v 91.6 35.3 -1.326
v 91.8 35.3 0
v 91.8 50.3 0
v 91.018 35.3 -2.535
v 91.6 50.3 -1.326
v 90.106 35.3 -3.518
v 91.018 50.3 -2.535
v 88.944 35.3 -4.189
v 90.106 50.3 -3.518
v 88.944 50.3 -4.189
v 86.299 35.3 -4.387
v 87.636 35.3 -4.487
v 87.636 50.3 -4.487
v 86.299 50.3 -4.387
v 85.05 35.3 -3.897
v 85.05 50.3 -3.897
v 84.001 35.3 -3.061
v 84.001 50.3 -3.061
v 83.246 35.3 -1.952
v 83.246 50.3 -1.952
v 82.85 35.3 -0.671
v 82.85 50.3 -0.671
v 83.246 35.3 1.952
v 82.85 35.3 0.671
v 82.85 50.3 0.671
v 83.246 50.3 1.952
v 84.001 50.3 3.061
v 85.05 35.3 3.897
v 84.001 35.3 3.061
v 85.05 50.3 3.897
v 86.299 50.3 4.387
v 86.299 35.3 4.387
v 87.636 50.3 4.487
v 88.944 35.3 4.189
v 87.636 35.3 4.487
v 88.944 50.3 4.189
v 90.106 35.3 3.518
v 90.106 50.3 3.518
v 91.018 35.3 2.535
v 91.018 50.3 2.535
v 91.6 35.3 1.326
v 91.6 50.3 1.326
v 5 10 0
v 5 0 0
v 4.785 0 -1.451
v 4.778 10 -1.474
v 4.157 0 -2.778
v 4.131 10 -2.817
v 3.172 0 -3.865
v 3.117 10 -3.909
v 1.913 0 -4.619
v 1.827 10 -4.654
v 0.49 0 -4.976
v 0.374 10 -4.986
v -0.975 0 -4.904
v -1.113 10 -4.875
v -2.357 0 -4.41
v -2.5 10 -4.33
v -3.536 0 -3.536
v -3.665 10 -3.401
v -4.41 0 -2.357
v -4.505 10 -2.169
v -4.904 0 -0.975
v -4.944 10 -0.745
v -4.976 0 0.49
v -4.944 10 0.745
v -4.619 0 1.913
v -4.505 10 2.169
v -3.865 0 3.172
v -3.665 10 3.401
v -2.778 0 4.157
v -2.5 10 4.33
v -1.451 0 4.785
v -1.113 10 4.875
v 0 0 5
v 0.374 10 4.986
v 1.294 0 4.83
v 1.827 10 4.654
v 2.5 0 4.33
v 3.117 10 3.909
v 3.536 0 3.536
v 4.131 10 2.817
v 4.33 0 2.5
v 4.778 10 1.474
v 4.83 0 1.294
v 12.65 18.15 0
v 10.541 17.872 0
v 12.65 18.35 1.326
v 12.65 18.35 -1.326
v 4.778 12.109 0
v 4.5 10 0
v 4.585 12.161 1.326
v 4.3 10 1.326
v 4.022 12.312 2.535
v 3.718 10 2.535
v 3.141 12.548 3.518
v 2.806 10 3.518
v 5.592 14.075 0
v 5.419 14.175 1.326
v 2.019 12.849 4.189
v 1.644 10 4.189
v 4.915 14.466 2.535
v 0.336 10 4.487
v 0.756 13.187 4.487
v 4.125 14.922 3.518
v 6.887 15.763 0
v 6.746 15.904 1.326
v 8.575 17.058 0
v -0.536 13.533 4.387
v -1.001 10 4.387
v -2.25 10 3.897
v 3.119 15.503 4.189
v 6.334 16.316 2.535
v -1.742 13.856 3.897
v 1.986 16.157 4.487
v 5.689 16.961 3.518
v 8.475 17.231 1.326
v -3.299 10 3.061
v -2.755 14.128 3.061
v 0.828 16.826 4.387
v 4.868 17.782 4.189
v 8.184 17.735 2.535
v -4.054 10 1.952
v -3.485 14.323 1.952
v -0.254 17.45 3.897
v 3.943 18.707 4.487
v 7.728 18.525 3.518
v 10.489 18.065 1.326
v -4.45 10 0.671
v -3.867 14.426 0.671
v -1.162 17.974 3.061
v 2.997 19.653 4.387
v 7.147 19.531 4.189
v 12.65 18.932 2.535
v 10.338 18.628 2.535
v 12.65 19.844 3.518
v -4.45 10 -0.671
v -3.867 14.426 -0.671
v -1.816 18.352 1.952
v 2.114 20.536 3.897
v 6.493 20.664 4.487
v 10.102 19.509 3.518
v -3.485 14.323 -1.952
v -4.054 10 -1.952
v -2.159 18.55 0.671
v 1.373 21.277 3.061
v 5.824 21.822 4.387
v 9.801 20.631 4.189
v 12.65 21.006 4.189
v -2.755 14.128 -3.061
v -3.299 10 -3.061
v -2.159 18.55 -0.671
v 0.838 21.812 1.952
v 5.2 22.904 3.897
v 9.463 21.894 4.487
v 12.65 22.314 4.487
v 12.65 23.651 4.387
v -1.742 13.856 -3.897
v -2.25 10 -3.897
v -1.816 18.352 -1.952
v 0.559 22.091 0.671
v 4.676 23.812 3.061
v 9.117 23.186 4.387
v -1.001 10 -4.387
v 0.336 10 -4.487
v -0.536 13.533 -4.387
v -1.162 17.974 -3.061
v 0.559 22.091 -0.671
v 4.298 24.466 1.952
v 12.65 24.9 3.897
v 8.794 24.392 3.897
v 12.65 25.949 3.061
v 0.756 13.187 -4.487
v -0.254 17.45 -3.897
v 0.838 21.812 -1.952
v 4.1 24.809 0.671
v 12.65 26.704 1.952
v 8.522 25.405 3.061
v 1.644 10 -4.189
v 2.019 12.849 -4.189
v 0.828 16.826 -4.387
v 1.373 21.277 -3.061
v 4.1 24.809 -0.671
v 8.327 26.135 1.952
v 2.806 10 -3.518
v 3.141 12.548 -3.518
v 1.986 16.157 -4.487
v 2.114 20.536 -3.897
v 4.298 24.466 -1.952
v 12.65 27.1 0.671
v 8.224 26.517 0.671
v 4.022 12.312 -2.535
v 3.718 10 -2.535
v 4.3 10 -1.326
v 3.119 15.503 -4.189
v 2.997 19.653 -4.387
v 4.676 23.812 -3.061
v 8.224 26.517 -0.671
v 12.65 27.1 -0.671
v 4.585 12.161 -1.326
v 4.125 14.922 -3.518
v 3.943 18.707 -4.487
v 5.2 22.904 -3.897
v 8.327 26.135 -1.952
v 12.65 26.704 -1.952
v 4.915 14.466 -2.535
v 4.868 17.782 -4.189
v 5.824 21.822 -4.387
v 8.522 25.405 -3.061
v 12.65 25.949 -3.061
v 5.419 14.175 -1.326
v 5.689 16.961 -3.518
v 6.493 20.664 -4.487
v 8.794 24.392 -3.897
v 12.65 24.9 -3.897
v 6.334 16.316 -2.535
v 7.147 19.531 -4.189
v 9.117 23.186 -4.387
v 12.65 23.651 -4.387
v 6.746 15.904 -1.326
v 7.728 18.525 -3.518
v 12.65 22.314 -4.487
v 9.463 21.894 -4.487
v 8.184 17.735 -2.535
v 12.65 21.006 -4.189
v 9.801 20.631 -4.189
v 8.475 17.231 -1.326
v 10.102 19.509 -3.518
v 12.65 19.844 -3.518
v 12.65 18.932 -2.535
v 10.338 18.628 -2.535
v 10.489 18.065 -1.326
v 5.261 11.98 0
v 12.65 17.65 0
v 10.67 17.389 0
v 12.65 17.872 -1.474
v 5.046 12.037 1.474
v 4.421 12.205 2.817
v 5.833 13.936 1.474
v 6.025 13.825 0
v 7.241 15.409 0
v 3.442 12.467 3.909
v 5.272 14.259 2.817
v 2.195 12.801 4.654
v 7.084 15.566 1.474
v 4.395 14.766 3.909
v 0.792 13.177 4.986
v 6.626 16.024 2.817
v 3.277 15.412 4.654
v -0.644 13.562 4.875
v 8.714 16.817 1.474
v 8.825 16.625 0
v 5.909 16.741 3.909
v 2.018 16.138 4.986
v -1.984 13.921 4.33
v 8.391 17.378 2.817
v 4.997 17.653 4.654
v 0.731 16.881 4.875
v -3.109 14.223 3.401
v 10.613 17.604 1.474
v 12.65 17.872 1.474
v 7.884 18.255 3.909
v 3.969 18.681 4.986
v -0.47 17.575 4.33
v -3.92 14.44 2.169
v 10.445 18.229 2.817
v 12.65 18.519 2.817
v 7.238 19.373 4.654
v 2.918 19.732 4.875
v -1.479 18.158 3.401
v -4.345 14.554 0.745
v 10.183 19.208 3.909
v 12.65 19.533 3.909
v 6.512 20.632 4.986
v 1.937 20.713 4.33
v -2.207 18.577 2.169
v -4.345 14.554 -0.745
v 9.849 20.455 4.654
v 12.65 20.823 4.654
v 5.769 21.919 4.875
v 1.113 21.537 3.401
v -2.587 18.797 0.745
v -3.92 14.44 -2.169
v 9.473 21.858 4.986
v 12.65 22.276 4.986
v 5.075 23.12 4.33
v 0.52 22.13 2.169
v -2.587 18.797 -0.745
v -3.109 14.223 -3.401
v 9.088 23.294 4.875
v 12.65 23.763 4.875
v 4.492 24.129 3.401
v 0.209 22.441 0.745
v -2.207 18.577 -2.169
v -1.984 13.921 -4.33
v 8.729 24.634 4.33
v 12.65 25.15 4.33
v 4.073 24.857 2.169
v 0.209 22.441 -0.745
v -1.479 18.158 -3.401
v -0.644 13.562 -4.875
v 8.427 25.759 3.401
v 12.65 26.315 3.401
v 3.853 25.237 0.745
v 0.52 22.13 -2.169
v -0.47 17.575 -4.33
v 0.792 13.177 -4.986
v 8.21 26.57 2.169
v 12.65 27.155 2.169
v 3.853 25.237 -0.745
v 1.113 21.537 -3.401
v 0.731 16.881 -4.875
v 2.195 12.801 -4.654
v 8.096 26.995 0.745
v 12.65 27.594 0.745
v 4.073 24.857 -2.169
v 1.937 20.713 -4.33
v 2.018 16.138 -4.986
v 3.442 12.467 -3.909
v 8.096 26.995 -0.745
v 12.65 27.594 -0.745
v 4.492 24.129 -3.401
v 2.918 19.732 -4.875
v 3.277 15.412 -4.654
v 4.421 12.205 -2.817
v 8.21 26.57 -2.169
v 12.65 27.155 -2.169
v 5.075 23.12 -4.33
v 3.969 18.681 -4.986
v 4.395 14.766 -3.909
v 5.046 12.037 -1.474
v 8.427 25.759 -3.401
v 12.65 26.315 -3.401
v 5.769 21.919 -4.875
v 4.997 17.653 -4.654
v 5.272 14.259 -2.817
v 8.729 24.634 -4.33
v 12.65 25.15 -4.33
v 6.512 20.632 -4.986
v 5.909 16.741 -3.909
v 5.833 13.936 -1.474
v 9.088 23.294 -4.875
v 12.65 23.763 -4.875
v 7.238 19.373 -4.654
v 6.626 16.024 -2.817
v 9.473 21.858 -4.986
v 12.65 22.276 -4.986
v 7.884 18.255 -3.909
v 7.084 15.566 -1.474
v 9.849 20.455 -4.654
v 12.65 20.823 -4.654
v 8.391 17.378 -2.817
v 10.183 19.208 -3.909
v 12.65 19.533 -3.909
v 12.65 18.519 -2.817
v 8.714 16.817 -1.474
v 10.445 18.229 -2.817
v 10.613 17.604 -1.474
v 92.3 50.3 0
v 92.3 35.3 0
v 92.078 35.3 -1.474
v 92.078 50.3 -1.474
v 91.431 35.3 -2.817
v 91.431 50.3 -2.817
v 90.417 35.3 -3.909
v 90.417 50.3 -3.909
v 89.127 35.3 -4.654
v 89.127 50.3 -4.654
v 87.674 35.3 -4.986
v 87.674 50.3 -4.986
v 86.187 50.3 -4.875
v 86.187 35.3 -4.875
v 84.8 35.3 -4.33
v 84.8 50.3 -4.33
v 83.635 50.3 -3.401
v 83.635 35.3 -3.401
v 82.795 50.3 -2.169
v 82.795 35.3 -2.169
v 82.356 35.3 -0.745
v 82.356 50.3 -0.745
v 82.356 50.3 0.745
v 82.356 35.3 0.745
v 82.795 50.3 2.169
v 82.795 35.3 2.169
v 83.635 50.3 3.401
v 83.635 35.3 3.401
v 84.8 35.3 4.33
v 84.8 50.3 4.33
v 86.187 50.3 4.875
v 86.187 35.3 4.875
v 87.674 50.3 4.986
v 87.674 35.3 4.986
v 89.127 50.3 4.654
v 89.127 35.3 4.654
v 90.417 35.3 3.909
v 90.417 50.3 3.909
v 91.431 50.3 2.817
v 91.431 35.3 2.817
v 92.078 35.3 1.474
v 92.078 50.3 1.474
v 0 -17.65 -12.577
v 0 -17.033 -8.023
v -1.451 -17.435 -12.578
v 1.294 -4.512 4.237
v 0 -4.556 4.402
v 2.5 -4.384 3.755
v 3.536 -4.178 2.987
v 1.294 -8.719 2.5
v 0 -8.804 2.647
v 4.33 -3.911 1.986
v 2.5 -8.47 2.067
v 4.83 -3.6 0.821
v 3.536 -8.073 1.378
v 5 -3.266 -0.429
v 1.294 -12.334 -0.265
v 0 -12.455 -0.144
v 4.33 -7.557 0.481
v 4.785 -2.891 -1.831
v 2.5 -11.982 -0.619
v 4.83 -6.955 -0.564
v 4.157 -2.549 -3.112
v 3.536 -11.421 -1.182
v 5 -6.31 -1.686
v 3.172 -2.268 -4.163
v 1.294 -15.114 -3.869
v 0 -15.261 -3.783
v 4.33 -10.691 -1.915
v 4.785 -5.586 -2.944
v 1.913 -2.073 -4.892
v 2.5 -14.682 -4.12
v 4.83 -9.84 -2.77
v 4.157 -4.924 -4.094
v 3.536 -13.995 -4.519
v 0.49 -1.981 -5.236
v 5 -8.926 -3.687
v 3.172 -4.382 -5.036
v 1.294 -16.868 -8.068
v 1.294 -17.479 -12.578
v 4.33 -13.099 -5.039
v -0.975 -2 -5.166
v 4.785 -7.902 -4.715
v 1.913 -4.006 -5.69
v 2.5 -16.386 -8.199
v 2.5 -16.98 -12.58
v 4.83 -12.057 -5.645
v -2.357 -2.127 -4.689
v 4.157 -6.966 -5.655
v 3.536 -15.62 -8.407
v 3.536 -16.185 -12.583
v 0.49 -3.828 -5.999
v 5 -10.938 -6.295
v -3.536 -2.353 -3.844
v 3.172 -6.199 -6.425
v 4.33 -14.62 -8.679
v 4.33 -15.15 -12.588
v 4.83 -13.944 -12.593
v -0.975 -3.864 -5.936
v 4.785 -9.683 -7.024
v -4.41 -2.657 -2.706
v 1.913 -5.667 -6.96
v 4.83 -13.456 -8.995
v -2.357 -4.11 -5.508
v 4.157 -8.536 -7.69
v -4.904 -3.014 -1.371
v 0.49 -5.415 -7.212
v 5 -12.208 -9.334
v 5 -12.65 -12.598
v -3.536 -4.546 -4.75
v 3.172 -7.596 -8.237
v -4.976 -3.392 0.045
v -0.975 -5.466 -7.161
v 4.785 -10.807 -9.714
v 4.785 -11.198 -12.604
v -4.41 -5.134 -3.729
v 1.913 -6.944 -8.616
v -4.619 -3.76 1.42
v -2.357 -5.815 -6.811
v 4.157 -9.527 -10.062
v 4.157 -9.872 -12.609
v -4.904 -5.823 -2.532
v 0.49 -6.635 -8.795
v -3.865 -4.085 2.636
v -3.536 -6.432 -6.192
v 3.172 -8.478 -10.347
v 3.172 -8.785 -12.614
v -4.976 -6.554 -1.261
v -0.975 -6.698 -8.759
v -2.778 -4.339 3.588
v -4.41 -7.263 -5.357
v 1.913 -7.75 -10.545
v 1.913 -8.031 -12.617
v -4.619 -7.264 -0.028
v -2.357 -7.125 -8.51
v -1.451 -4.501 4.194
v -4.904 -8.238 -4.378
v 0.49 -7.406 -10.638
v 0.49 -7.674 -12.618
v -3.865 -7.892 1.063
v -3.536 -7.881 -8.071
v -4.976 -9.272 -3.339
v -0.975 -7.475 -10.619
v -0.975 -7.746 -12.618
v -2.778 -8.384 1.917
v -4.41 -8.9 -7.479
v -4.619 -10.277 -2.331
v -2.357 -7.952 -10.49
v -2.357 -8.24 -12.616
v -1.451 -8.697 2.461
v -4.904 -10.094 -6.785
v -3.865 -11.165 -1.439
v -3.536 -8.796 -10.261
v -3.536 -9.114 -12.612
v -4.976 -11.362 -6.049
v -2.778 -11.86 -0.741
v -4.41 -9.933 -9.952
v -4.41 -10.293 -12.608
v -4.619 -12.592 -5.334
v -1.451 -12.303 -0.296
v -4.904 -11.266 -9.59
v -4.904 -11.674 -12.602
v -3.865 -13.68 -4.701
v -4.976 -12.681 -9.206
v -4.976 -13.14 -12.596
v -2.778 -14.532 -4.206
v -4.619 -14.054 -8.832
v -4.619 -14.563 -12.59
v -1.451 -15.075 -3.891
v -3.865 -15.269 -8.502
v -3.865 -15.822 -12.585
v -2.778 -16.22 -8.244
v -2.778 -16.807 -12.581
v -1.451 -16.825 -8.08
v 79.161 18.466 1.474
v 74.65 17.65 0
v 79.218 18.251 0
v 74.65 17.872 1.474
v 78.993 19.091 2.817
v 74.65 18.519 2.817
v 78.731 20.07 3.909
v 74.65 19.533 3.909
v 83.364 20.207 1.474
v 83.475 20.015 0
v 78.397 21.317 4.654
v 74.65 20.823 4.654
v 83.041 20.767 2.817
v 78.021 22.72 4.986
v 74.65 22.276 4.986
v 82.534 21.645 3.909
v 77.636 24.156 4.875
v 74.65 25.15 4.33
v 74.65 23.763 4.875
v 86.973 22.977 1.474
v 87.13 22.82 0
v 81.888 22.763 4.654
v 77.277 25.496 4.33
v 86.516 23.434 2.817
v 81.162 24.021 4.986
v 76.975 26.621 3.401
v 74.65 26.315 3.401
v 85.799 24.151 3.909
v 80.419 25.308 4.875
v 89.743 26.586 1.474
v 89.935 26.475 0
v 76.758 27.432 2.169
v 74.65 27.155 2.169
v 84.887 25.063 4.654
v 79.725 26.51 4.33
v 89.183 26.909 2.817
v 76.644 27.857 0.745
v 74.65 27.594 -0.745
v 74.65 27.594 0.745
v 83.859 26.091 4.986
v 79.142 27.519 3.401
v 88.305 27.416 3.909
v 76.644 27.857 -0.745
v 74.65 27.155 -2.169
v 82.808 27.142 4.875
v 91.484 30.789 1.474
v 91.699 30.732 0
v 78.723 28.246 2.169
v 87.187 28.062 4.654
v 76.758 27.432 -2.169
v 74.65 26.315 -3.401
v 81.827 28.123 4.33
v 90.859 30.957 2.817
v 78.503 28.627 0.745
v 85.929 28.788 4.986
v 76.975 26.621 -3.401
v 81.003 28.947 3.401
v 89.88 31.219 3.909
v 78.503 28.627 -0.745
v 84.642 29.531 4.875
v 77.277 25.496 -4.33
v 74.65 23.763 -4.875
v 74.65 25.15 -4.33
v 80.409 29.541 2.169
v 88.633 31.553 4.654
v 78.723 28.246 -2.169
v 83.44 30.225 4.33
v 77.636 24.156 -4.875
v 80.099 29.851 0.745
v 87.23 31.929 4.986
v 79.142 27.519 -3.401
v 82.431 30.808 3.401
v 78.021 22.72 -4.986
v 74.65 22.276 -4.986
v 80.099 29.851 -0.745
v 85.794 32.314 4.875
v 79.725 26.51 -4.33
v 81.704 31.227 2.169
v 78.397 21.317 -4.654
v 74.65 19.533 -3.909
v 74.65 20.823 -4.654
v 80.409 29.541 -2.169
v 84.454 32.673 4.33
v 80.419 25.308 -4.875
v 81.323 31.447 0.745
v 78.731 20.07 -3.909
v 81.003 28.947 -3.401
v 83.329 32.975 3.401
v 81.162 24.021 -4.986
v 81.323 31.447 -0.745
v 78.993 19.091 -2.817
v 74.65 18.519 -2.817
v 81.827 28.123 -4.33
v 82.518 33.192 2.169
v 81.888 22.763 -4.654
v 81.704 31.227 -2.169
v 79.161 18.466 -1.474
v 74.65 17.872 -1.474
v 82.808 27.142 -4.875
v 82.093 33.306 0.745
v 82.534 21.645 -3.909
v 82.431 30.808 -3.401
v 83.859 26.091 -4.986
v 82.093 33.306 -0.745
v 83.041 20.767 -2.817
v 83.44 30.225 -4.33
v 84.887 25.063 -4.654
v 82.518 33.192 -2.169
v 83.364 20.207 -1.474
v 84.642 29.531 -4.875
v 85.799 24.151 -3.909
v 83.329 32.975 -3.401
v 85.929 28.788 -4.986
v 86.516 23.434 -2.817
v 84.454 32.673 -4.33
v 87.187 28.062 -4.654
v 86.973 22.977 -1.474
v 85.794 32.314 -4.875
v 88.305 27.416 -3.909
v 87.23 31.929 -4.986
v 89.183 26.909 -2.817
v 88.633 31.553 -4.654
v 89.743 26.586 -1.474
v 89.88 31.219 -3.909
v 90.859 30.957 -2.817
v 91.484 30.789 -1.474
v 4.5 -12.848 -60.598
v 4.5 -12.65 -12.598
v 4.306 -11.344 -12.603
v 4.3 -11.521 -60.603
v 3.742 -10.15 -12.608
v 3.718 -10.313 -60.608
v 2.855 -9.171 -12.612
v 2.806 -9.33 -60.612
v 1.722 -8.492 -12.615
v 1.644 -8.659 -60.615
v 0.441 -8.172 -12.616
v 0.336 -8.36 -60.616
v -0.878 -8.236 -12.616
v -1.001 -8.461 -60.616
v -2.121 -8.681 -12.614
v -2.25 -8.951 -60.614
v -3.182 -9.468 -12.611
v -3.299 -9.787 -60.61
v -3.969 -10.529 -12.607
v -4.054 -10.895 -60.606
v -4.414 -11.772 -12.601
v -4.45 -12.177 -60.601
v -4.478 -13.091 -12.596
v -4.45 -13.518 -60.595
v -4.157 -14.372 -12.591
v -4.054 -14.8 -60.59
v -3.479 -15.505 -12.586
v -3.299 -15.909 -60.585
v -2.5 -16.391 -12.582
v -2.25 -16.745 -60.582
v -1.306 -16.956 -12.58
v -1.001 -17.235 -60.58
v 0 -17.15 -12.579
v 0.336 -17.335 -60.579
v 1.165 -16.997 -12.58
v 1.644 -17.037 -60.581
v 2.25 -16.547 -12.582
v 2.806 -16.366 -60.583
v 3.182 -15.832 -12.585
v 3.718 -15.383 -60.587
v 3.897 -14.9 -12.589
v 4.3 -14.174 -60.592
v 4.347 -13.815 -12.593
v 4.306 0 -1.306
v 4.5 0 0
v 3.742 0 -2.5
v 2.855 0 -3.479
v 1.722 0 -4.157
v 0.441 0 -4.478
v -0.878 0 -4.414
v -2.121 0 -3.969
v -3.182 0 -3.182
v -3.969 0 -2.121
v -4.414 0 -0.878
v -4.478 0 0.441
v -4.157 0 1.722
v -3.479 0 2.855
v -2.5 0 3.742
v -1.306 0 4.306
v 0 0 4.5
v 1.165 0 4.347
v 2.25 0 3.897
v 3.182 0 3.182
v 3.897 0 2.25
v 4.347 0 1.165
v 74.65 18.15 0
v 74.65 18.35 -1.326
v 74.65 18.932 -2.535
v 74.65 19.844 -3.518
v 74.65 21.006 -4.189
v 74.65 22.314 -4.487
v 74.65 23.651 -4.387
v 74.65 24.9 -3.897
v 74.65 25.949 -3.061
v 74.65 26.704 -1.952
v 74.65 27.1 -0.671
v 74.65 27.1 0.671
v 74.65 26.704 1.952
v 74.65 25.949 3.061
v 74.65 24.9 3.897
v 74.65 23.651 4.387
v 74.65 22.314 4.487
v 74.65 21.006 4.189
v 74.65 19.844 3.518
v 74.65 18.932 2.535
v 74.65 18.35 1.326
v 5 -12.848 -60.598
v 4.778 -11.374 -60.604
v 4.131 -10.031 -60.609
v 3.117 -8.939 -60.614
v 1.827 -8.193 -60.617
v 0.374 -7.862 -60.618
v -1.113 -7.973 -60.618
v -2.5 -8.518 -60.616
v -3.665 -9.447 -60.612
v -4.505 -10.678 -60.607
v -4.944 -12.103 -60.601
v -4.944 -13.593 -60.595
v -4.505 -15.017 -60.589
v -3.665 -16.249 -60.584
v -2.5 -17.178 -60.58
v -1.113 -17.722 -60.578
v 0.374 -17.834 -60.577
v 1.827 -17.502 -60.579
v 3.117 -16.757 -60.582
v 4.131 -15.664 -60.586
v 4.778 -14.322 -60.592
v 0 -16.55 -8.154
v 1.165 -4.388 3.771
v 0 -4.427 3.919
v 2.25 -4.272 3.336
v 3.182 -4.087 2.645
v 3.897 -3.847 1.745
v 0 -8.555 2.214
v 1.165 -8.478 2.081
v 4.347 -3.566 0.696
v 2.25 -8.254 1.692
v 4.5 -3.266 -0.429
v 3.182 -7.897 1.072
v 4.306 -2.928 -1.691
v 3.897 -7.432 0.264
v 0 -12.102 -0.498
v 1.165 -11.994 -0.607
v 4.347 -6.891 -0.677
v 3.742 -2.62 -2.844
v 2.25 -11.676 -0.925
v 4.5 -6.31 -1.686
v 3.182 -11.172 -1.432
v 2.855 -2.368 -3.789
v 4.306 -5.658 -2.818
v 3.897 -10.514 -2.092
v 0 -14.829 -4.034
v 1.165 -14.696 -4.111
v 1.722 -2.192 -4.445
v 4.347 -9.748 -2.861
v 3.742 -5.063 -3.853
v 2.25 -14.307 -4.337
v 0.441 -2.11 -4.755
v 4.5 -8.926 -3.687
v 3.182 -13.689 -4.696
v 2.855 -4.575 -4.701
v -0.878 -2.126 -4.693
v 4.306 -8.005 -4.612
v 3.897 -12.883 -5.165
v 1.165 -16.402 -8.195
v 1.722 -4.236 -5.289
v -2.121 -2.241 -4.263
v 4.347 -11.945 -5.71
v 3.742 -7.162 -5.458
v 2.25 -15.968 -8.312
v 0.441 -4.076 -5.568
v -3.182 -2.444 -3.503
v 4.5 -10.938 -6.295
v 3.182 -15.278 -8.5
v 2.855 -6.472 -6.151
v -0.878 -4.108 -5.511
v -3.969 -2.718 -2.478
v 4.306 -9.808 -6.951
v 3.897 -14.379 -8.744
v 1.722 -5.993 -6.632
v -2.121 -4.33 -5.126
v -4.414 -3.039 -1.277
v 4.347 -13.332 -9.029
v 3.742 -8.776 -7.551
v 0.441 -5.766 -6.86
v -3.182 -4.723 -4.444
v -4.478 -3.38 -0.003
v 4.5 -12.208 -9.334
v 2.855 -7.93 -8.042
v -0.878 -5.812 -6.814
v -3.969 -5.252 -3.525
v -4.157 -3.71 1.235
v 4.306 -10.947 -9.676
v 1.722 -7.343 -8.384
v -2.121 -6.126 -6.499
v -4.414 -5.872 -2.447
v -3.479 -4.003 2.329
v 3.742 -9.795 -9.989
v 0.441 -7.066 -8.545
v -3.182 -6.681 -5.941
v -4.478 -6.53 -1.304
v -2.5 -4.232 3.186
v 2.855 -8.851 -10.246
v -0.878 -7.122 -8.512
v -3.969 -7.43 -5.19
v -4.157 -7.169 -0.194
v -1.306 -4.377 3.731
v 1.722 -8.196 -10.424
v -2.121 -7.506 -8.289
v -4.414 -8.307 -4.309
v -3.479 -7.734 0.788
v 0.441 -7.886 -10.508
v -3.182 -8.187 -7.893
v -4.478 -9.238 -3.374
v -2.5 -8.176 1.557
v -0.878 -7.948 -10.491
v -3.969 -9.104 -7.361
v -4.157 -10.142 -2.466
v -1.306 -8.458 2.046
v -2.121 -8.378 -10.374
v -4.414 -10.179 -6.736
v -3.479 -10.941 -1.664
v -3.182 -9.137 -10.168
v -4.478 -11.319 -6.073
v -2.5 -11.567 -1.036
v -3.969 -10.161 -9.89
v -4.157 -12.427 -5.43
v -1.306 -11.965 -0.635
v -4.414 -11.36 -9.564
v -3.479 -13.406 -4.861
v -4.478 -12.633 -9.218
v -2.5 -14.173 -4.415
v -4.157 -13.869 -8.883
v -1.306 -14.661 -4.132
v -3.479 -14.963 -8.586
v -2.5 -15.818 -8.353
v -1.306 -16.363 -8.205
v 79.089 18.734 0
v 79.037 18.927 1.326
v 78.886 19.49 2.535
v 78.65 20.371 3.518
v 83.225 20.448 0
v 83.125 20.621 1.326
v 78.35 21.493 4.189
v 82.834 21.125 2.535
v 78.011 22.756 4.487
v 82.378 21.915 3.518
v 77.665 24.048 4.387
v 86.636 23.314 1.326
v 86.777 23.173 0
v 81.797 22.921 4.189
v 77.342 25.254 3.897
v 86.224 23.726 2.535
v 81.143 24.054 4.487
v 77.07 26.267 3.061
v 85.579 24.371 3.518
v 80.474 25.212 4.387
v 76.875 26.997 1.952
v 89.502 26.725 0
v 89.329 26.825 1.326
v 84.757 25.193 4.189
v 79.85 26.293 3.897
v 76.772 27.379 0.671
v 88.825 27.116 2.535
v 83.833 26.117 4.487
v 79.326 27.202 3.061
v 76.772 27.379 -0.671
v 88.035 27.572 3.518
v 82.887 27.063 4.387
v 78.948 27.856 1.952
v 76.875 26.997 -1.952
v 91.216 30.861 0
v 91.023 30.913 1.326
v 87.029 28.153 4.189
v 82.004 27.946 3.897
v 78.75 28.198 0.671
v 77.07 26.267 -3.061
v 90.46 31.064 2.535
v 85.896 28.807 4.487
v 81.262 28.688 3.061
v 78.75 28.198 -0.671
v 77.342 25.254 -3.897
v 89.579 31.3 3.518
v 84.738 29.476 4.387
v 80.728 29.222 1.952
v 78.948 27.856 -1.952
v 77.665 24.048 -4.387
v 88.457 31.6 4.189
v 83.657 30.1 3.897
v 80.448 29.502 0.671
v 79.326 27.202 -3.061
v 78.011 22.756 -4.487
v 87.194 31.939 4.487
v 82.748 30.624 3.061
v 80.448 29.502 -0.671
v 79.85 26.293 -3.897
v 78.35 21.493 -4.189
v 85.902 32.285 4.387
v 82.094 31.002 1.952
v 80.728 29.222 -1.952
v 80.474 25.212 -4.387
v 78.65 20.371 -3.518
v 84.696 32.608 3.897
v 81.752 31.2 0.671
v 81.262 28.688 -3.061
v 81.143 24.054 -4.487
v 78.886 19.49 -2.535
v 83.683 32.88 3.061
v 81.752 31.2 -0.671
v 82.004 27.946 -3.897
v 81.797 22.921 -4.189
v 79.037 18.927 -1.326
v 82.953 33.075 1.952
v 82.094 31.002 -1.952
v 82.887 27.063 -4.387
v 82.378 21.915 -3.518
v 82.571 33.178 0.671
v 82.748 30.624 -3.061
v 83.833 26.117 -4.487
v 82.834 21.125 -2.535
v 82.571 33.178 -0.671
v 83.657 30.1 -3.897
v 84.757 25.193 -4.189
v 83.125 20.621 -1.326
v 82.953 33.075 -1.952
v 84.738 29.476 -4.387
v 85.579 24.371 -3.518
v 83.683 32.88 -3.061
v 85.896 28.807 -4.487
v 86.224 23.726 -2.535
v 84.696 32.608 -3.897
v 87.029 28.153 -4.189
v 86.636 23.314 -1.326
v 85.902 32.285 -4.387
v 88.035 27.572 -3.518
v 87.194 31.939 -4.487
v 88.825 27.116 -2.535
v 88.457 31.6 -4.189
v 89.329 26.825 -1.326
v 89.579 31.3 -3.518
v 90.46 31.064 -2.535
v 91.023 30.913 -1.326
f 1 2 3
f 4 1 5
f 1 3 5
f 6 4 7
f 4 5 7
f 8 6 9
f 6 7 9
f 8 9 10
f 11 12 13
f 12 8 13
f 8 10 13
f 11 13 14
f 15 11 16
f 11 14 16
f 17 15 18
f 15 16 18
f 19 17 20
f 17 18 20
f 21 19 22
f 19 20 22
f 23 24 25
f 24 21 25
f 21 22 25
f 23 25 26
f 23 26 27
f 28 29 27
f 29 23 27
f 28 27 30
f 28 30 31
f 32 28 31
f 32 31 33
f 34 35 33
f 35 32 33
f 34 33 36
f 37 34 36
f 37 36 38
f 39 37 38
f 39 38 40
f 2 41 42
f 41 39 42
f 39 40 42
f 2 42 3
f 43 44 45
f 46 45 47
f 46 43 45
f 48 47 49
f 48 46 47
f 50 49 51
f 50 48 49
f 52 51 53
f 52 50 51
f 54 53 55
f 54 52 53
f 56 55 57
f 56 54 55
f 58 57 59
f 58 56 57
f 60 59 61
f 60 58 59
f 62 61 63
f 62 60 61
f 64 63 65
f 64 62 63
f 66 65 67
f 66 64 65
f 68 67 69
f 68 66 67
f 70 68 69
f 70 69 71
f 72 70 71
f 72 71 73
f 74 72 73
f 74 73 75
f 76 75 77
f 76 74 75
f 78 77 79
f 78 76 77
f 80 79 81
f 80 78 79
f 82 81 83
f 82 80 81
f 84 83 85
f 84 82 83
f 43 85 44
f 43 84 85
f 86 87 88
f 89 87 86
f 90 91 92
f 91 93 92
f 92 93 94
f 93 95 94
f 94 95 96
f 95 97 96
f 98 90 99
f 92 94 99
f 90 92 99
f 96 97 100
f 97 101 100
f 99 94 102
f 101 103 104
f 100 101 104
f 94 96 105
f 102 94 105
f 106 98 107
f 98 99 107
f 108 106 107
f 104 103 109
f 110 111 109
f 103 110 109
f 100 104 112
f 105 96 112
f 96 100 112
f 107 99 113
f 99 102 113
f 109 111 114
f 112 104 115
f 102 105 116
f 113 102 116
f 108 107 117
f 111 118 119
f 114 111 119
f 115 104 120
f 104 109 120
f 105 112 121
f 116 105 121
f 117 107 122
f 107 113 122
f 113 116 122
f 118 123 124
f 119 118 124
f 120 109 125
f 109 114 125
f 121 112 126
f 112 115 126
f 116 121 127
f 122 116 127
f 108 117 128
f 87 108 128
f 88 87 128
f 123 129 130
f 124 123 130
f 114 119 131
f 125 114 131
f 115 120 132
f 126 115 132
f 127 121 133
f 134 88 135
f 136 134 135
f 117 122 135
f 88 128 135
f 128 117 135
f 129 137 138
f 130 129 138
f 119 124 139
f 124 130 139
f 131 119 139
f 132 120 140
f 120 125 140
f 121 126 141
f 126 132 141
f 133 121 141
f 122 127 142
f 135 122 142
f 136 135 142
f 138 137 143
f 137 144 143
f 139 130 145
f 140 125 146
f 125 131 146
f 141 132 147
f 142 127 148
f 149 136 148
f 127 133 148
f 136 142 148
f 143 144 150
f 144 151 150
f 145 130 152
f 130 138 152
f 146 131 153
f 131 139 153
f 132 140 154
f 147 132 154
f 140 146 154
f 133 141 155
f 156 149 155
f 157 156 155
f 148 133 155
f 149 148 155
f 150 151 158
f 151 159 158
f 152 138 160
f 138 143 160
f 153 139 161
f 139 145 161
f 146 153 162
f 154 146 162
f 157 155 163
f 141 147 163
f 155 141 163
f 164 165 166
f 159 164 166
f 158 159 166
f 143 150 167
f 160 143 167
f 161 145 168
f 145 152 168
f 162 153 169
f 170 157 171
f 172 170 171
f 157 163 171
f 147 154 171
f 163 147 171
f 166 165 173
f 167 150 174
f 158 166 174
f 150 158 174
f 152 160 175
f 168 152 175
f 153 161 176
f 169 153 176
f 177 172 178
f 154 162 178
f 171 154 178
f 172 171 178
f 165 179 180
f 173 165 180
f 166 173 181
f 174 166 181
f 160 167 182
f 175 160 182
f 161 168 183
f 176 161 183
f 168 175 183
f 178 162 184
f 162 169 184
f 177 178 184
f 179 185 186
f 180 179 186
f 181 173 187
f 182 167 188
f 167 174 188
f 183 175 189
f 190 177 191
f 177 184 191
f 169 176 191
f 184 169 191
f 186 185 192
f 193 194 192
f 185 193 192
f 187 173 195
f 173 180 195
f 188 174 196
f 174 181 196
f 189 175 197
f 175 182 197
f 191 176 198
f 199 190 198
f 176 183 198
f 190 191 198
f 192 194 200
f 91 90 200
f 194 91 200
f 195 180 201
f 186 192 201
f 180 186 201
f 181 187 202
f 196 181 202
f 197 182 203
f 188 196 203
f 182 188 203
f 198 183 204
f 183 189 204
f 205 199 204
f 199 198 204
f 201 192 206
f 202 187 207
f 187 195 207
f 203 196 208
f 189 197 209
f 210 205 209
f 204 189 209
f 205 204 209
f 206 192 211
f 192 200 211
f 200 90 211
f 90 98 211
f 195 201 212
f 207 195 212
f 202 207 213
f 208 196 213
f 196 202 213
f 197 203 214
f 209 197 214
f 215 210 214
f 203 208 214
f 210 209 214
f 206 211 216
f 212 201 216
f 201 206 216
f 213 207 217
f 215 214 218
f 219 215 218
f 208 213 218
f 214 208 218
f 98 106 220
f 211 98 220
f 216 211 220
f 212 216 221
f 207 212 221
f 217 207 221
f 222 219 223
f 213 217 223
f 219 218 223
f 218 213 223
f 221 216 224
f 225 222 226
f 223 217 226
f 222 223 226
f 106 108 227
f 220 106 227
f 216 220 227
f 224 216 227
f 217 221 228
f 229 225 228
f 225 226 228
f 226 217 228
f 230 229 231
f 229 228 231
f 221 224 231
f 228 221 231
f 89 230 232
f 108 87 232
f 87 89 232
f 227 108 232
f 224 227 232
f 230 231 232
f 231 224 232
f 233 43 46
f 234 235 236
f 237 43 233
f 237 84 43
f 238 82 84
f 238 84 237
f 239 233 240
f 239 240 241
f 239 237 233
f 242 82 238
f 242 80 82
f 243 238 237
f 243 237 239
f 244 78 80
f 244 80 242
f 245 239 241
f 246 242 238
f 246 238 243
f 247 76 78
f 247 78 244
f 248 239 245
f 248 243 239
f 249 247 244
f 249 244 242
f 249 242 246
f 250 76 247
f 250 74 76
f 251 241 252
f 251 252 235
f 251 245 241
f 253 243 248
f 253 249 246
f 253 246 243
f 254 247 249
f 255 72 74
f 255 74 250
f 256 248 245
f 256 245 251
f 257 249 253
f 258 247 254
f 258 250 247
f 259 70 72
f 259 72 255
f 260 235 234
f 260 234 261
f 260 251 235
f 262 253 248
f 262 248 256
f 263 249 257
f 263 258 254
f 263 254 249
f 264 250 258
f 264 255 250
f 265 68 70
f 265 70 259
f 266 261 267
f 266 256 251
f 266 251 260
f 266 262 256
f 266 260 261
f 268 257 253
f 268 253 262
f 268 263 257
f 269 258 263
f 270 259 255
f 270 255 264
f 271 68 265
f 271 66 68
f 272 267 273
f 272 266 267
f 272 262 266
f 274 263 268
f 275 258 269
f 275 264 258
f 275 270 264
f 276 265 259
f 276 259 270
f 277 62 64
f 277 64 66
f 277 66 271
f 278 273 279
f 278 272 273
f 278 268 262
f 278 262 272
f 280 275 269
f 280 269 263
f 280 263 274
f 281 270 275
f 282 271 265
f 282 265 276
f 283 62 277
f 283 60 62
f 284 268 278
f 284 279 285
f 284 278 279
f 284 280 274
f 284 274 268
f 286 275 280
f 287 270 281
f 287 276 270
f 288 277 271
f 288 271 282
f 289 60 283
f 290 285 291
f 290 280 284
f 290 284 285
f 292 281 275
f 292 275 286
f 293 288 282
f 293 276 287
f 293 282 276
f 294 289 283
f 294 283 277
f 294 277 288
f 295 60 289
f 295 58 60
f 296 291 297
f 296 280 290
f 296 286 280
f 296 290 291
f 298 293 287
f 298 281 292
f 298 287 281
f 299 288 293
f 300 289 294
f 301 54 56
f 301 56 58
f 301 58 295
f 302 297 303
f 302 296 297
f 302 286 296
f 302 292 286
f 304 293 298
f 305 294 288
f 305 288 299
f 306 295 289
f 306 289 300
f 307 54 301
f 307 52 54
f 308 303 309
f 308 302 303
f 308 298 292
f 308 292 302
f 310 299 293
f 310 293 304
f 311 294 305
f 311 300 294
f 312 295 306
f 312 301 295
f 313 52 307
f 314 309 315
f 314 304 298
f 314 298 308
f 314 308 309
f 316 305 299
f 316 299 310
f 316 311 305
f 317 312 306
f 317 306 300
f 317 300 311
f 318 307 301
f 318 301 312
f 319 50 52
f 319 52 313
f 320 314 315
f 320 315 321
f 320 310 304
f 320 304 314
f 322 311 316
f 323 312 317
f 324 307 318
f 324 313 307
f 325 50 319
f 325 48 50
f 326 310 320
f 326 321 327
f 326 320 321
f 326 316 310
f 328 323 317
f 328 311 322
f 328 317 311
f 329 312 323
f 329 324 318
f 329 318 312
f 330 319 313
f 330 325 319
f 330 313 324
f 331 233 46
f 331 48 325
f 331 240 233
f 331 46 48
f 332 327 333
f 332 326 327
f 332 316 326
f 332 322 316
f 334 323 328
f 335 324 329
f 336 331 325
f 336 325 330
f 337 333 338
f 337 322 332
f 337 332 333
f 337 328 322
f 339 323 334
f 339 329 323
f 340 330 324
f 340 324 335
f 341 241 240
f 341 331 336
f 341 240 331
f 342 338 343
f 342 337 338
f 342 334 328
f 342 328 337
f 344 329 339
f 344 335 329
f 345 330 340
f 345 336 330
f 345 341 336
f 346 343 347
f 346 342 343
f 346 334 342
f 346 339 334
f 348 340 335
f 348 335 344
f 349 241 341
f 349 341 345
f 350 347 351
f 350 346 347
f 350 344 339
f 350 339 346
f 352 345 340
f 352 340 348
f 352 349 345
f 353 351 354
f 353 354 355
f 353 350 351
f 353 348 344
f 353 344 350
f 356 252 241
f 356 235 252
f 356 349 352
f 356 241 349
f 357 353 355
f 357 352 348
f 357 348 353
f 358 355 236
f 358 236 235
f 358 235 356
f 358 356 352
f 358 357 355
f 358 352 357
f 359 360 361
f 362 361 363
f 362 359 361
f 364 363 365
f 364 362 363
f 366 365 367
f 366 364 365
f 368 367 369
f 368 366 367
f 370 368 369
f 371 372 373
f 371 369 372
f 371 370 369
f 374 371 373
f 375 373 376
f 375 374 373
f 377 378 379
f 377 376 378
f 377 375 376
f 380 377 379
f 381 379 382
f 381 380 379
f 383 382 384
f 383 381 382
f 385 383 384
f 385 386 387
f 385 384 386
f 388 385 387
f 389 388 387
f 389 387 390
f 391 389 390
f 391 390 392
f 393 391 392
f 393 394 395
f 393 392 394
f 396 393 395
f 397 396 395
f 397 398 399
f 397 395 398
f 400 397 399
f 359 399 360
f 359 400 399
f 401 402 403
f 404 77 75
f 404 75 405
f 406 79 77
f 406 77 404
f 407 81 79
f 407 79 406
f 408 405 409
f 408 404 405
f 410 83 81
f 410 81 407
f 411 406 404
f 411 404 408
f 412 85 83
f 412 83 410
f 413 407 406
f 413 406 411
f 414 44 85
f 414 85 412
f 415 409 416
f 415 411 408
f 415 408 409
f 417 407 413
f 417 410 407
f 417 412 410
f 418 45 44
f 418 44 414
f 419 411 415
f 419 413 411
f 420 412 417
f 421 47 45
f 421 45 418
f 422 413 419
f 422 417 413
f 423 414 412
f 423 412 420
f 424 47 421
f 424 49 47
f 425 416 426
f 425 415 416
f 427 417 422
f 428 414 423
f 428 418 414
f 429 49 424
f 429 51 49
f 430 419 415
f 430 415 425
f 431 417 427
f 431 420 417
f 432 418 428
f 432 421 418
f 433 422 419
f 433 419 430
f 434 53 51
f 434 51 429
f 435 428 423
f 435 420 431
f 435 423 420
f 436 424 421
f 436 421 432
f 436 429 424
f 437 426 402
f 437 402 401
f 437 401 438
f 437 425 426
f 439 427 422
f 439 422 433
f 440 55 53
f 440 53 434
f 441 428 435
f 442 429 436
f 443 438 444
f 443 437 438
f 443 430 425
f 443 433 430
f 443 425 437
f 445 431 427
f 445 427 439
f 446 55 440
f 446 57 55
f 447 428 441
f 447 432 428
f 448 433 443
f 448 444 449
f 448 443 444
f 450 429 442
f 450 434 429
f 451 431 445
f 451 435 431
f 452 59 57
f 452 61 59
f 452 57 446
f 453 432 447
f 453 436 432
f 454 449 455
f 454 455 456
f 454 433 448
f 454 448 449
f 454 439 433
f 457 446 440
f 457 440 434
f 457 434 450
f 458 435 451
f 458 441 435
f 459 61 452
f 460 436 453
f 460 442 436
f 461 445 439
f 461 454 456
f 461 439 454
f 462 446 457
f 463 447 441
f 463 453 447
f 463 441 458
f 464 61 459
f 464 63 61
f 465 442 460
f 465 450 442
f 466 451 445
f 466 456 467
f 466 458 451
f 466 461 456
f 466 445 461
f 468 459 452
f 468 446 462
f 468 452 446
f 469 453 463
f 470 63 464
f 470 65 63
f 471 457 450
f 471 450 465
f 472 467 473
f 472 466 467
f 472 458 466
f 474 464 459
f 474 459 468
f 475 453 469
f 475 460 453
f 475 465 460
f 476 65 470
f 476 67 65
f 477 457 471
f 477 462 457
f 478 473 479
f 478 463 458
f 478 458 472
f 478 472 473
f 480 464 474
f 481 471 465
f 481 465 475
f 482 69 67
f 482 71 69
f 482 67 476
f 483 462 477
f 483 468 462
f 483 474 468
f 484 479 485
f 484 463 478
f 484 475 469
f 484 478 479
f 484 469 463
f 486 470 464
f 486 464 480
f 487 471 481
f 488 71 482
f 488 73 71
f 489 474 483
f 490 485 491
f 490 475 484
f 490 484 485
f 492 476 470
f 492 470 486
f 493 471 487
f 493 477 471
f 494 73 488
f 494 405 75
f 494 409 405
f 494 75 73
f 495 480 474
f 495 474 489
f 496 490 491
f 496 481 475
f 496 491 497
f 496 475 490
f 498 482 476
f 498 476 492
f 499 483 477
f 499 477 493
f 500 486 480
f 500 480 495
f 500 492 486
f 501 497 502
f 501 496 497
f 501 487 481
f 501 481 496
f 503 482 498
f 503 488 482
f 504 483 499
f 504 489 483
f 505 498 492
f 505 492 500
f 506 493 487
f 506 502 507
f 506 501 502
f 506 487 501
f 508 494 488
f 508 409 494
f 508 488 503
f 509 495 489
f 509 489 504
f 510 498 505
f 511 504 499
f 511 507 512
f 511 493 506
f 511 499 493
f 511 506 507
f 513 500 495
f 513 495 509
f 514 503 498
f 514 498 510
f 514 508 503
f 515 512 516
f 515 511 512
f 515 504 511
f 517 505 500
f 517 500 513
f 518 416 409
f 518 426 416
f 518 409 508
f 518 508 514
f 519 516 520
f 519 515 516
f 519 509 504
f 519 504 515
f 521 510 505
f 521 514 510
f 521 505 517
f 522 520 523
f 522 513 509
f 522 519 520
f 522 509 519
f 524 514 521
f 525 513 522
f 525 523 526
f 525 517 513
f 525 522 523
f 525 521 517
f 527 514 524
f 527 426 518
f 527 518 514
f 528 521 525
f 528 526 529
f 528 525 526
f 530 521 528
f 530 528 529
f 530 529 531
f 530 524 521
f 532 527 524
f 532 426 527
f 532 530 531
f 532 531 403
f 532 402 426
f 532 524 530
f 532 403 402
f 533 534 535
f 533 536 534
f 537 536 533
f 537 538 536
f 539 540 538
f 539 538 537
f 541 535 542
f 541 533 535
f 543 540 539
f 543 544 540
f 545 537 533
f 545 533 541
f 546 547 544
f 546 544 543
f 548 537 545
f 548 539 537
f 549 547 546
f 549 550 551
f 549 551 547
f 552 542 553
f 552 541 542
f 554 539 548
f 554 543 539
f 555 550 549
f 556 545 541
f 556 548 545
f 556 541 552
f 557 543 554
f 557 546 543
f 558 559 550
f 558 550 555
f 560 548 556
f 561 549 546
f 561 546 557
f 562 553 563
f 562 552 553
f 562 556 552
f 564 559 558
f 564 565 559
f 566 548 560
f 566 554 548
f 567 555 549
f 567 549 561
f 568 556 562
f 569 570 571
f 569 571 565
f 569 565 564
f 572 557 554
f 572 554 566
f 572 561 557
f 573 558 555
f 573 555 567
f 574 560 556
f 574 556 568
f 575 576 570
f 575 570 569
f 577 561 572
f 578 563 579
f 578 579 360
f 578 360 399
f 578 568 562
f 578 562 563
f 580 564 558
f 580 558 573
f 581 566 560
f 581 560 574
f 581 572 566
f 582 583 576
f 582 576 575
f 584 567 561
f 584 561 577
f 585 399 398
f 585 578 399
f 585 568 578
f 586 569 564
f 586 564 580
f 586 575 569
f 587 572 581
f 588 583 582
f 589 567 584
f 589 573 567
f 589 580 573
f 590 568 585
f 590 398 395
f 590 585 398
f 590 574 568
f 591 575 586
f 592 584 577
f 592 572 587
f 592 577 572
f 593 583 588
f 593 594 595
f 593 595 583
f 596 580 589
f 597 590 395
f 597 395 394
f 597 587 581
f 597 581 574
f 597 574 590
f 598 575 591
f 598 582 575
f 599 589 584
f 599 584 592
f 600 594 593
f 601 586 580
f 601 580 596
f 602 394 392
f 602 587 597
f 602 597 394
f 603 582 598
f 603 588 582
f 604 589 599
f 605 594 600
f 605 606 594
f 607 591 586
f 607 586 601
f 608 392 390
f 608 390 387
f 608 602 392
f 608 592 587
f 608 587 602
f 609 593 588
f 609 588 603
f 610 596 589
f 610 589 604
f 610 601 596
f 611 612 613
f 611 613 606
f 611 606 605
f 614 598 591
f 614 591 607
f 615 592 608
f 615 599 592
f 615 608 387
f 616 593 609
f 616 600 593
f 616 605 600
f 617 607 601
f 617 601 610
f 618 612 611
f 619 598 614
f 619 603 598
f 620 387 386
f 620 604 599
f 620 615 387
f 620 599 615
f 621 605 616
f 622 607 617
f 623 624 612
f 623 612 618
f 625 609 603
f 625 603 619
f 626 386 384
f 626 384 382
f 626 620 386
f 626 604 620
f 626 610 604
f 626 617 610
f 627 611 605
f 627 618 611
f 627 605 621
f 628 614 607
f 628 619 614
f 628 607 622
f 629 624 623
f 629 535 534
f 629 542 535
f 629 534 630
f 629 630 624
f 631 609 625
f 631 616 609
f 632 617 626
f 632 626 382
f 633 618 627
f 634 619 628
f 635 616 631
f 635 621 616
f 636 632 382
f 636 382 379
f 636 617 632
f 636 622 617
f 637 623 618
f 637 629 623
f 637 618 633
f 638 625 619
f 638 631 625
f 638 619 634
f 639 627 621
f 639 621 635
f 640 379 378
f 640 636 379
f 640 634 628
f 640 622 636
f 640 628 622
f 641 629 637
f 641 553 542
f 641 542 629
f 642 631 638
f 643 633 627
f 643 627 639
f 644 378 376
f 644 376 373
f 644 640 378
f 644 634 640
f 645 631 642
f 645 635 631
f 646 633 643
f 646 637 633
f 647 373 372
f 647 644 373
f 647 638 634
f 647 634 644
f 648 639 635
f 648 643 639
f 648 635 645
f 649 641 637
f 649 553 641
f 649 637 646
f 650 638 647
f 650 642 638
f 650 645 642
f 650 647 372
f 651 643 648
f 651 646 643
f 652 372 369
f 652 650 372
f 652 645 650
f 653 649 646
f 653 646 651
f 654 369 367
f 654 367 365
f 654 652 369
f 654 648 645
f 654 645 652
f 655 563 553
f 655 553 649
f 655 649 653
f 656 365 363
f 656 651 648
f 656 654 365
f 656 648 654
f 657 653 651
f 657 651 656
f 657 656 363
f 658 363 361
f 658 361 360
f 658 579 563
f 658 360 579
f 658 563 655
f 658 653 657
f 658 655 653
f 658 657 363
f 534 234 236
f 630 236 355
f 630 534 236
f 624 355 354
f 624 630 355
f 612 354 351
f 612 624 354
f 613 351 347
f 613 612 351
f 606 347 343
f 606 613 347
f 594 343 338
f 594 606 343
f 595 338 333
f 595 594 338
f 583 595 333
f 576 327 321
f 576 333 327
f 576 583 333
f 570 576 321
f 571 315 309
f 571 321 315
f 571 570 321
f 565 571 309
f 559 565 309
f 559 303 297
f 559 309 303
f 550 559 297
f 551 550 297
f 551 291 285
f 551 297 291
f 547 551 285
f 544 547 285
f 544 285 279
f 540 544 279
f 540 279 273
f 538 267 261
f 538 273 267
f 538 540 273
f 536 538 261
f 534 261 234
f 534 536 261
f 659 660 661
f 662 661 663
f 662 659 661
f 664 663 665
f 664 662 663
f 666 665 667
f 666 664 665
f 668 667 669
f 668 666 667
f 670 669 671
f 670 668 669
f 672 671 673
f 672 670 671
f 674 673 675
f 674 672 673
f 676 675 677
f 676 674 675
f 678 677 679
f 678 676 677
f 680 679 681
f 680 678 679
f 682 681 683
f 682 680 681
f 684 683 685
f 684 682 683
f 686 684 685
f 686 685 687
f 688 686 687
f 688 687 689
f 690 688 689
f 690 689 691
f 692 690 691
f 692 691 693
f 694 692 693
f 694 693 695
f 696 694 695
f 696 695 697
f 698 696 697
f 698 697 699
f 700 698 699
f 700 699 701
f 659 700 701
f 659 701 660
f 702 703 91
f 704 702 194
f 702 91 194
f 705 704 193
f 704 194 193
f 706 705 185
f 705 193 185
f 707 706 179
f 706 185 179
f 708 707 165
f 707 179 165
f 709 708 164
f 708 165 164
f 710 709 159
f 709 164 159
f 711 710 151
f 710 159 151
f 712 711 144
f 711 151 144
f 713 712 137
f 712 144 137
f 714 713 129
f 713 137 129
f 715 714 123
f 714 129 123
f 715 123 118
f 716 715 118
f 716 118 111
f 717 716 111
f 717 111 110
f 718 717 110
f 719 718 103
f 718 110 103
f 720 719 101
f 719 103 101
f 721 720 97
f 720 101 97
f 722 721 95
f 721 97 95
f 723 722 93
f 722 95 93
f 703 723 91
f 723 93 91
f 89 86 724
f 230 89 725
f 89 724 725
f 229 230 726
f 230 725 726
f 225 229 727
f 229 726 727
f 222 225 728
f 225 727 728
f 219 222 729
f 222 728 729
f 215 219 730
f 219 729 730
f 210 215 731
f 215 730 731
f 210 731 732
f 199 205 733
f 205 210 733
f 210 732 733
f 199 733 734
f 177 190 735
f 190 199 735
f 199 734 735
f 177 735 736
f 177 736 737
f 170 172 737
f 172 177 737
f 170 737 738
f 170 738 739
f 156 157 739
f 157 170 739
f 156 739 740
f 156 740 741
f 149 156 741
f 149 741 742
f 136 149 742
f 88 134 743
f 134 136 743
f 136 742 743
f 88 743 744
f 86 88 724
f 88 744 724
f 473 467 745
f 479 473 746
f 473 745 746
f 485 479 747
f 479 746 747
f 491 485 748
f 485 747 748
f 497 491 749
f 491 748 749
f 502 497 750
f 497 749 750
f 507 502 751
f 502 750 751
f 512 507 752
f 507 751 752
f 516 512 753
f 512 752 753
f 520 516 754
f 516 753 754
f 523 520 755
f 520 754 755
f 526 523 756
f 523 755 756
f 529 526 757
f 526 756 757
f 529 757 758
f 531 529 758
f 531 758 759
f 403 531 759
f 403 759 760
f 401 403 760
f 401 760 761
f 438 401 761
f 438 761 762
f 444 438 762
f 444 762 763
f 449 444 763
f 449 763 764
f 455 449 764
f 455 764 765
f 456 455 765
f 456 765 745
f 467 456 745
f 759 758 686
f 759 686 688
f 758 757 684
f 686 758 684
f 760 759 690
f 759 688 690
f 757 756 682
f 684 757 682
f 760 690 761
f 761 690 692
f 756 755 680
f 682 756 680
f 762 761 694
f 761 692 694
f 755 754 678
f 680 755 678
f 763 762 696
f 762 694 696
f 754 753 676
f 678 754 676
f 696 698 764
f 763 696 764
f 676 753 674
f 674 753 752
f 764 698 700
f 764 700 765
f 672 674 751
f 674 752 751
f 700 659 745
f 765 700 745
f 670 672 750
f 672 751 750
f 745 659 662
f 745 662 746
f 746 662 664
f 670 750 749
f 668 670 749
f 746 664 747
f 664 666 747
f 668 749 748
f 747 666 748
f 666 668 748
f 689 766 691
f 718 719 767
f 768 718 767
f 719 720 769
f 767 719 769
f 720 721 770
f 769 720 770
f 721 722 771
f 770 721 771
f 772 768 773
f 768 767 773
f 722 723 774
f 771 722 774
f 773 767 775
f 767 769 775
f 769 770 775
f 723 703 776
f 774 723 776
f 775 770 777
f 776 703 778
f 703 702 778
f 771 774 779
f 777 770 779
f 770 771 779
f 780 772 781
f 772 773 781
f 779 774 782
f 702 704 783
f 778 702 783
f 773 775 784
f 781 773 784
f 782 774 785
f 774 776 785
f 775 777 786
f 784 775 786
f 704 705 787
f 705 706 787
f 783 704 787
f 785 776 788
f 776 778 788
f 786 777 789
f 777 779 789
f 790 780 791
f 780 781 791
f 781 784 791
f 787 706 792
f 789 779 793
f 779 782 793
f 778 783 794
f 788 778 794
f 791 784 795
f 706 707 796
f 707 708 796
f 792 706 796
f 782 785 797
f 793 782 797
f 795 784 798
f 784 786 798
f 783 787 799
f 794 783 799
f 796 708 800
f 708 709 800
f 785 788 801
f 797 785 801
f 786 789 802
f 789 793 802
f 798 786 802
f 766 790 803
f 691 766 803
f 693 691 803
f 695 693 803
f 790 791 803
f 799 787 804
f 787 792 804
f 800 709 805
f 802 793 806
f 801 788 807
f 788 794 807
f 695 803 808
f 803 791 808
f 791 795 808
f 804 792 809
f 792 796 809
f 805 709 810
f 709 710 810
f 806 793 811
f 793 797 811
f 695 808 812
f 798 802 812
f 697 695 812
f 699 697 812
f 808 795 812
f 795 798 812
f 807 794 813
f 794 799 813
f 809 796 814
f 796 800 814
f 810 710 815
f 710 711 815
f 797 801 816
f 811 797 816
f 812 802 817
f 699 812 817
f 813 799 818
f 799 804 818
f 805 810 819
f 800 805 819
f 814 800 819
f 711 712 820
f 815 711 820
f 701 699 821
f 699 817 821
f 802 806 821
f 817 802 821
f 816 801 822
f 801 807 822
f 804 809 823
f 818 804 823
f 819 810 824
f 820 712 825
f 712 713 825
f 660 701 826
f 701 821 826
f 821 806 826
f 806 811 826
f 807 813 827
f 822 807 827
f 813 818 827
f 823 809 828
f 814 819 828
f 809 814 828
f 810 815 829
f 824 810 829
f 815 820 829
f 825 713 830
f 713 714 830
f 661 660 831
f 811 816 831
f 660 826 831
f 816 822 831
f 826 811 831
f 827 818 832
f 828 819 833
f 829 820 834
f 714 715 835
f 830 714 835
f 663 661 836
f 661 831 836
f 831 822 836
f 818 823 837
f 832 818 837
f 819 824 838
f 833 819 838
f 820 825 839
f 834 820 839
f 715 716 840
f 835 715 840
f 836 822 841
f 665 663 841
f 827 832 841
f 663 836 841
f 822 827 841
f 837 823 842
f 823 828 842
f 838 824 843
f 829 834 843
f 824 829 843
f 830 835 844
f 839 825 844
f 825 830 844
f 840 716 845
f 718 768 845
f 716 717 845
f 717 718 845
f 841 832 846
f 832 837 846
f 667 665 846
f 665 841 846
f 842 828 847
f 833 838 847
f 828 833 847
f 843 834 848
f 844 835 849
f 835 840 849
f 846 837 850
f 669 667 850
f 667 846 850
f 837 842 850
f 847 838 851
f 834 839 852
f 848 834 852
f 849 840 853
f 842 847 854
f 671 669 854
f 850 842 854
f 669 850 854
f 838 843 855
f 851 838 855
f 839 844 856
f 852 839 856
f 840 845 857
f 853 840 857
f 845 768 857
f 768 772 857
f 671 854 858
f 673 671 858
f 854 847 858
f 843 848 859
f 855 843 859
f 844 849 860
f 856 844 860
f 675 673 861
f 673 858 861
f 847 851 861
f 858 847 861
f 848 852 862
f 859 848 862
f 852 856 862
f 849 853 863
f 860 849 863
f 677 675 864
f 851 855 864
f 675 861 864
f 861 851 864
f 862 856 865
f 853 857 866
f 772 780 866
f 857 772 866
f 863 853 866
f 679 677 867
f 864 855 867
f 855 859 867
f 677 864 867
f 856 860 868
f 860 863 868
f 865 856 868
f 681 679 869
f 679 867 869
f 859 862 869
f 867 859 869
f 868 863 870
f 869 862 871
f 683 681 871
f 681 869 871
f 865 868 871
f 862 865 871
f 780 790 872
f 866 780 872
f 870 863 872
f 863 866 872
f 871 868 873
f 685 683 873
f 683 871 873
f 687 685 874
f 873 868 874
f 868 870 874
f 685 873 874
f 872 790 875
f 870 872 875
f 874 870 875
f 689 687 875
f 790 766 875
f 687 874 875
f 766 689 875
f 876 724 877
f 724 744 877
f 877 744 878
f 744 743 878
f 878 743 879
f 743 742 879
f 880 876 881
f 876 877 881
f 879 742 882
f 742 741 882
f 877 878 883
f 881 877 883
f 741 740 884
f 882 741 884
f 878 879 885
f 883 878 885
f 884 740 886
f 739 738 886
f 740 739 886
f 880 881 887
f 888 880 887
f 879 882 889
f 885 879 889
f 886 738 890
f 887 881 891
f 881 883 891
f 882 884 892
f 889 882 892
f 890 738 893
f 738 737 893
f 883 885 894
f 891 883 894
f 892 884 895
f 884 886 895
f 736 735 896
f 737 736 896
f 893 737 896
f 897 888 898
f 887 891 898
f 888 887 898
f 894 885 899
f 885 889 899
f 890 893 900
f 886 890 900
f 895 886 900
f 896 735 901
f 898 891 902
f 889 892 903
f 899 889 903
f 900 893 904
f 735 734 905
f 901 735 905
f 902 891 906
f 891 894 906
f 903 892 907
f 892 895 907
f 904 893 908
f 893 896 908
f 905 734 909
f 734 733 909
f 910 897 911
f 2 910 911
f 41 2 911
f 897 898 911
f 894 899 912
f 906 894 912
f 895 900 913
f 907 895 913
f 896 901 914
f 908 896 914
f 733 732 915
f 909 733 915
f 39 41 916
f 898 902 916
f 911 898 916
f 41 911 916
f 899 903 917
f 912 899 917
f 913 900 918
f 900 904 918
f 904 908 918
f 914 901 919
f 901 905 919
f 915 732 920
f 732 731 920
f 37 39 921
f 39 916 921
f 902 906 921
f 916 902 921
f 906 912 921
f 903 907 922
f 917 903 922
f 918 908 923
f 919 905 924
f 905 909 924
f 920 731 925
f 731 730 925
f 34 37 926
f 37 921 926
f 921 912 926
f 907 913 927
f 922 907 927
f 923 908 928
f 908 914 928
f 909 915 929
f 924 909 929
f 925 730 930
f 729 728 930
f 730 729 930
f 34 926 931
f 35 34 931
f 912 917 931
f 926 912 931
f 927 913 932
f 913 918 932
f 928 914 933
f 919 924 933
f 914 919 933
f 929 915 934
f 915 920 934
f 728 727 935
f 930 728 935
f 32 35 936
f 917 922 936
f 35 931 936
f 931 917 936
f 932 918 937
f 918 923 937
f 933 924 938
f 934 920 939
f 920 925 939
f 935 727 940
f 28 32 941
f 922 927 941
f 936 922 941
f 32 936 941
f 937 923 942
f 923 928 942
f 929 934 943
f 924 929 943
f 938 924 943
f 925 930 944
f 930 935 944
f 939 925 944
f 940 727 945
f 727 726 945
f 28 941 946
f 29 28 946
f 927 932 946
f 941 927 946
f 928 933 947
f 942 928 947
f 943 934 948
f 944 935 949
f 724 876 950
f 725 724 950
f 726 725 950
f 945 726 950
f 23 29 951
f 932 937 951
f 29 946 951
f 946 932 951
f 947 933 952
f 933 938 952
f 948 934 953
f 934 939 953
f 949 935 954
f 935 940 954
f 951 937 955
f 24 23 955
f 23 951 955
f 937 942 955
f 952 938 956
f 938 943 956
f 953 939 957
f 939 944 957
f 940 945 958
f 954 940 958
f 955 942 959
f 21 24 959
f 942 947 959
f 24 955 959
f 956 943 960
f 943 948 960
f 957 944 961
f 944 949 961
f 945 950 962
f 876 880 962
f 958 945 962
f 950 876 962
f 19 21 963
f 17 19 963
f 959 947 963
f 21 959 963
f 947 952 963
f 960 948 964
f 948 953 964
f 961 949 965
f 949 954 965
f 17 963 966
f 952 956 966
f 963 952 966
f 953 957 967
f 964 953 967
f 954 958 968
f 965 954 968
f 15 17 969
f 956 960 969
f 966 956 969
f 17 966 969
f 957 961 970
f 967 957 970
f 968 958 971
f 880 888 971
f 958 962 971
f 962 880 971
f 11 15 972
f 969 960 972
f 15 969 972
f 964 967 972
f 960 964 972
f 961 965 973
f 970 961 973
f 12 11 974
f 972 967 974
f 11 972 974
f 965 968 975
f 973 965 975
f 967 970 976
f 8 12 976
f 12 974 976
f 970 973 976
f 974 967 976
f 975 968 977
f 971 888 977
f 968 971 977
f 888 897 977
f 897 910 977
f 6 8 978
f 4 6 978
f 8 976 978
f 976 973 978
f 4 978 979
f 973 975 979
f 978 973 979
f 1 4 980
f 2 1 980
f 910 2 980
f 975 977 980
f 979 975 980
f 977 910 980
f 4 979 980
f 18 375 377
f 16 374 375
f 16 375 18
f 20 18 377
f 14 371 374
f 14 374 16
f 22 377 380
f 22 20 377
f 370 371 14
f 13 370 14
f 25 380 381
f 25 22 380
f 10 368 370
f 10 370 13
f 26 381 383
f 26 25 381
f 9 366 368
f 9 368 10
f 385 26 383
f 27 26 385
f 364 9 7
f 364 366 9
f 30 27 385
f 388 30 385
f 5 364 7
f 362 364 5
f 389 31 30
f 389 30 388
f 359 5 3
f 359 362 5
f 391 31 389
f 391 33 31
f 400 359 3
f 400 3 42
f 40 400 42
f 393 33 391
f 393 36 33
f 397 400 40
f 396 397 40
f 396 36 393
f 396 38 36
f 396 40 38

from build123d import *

# Parameters (mm, degrees)
SKETCH1_R          = 5
SWEEP2_START       = -60.650300513
SWEEP2_OUTLINE_R   = 5
SWEEP2_DEPTH       = 48.00040805
SWEEP2_2_OUTLINE_R = 5
SWEEP2_2_ANGLE     = 89.76375
SHELL1_T           = -0.5


with BuildPart() as part:
    # Sweep1: sweep along a path in Sketch2
    with BuildLine(Plane.XY) as sweep1_path:
        Line((0, 0), (0, 10))
        ThreePointArc((0, 10), (3.705099218, 18.944900782), (12.65, 22.65))
        Line((12.65, 22.65), (74.65, 22.65))
        ThreePointArc((74.65, 22.65), (83.594900782, 26.355099218), (87.3, 35.3))
        Line((87.3, 35.3), (87.3, 50.3))
    # Sketch1 → Sweep1 (sweep)
    with BuildSketch(Plane(origin=(0, 0, 0), x_dir=(1, 0, 0), z_dir=(0, 1, 0))):
        Circle(SKETCH1_R)
    sweep(path=sweep1_path.line)



with BuildPart() as body_2:
    # Sweep2: read off the stored shape, not the designer's step
    # Sweep2 outline → Sweep2 (new body)
    with BuildSketch(Plane(origin=(0, 0, 0), x_dir=(1, 0, 0), z_dir=(0, 0.00412333182871543, 0.999991499031182)).offset(SWEEP2_START)):
        with Locations((0, -12.597839852)):
            Circle(SWEEP2_OUTLINE_R)
    extrude(amount=SWEEP2_DEPTH)


with BuildPart() as part_1:
    add(part.part)

    add(body_2.part)  # Sweep2 2 merges body 2
    # Sweep2 2 outline → Sweep2 2 (revolve)
    with BuildSketch(Plane(origin=(0, 0, -12.65), x_dir=(0, 0, 1), z_dir=(0, 1, 0))):
        with Locations((12.65, 0)):
            Circle(SWEEP2_2_OUTLINE_R)
    revolve(axis=Axis((0, 0, -12.65), (1, 0, 0)), revolution_arc=SWEEP2_2_ANGLE)

    # Shell1
    shell1_openings = [part_1.faces().sort_by_distance(p)[0] for p in [
        (0, -12.847814073, -60.597839853),
        (87.3, 50.3, 0),
    ]]
    offset(amount=SHELL1_T, openings=shell1_openings, kind=Kind.INTERSECTION)


solid = part_1.part
